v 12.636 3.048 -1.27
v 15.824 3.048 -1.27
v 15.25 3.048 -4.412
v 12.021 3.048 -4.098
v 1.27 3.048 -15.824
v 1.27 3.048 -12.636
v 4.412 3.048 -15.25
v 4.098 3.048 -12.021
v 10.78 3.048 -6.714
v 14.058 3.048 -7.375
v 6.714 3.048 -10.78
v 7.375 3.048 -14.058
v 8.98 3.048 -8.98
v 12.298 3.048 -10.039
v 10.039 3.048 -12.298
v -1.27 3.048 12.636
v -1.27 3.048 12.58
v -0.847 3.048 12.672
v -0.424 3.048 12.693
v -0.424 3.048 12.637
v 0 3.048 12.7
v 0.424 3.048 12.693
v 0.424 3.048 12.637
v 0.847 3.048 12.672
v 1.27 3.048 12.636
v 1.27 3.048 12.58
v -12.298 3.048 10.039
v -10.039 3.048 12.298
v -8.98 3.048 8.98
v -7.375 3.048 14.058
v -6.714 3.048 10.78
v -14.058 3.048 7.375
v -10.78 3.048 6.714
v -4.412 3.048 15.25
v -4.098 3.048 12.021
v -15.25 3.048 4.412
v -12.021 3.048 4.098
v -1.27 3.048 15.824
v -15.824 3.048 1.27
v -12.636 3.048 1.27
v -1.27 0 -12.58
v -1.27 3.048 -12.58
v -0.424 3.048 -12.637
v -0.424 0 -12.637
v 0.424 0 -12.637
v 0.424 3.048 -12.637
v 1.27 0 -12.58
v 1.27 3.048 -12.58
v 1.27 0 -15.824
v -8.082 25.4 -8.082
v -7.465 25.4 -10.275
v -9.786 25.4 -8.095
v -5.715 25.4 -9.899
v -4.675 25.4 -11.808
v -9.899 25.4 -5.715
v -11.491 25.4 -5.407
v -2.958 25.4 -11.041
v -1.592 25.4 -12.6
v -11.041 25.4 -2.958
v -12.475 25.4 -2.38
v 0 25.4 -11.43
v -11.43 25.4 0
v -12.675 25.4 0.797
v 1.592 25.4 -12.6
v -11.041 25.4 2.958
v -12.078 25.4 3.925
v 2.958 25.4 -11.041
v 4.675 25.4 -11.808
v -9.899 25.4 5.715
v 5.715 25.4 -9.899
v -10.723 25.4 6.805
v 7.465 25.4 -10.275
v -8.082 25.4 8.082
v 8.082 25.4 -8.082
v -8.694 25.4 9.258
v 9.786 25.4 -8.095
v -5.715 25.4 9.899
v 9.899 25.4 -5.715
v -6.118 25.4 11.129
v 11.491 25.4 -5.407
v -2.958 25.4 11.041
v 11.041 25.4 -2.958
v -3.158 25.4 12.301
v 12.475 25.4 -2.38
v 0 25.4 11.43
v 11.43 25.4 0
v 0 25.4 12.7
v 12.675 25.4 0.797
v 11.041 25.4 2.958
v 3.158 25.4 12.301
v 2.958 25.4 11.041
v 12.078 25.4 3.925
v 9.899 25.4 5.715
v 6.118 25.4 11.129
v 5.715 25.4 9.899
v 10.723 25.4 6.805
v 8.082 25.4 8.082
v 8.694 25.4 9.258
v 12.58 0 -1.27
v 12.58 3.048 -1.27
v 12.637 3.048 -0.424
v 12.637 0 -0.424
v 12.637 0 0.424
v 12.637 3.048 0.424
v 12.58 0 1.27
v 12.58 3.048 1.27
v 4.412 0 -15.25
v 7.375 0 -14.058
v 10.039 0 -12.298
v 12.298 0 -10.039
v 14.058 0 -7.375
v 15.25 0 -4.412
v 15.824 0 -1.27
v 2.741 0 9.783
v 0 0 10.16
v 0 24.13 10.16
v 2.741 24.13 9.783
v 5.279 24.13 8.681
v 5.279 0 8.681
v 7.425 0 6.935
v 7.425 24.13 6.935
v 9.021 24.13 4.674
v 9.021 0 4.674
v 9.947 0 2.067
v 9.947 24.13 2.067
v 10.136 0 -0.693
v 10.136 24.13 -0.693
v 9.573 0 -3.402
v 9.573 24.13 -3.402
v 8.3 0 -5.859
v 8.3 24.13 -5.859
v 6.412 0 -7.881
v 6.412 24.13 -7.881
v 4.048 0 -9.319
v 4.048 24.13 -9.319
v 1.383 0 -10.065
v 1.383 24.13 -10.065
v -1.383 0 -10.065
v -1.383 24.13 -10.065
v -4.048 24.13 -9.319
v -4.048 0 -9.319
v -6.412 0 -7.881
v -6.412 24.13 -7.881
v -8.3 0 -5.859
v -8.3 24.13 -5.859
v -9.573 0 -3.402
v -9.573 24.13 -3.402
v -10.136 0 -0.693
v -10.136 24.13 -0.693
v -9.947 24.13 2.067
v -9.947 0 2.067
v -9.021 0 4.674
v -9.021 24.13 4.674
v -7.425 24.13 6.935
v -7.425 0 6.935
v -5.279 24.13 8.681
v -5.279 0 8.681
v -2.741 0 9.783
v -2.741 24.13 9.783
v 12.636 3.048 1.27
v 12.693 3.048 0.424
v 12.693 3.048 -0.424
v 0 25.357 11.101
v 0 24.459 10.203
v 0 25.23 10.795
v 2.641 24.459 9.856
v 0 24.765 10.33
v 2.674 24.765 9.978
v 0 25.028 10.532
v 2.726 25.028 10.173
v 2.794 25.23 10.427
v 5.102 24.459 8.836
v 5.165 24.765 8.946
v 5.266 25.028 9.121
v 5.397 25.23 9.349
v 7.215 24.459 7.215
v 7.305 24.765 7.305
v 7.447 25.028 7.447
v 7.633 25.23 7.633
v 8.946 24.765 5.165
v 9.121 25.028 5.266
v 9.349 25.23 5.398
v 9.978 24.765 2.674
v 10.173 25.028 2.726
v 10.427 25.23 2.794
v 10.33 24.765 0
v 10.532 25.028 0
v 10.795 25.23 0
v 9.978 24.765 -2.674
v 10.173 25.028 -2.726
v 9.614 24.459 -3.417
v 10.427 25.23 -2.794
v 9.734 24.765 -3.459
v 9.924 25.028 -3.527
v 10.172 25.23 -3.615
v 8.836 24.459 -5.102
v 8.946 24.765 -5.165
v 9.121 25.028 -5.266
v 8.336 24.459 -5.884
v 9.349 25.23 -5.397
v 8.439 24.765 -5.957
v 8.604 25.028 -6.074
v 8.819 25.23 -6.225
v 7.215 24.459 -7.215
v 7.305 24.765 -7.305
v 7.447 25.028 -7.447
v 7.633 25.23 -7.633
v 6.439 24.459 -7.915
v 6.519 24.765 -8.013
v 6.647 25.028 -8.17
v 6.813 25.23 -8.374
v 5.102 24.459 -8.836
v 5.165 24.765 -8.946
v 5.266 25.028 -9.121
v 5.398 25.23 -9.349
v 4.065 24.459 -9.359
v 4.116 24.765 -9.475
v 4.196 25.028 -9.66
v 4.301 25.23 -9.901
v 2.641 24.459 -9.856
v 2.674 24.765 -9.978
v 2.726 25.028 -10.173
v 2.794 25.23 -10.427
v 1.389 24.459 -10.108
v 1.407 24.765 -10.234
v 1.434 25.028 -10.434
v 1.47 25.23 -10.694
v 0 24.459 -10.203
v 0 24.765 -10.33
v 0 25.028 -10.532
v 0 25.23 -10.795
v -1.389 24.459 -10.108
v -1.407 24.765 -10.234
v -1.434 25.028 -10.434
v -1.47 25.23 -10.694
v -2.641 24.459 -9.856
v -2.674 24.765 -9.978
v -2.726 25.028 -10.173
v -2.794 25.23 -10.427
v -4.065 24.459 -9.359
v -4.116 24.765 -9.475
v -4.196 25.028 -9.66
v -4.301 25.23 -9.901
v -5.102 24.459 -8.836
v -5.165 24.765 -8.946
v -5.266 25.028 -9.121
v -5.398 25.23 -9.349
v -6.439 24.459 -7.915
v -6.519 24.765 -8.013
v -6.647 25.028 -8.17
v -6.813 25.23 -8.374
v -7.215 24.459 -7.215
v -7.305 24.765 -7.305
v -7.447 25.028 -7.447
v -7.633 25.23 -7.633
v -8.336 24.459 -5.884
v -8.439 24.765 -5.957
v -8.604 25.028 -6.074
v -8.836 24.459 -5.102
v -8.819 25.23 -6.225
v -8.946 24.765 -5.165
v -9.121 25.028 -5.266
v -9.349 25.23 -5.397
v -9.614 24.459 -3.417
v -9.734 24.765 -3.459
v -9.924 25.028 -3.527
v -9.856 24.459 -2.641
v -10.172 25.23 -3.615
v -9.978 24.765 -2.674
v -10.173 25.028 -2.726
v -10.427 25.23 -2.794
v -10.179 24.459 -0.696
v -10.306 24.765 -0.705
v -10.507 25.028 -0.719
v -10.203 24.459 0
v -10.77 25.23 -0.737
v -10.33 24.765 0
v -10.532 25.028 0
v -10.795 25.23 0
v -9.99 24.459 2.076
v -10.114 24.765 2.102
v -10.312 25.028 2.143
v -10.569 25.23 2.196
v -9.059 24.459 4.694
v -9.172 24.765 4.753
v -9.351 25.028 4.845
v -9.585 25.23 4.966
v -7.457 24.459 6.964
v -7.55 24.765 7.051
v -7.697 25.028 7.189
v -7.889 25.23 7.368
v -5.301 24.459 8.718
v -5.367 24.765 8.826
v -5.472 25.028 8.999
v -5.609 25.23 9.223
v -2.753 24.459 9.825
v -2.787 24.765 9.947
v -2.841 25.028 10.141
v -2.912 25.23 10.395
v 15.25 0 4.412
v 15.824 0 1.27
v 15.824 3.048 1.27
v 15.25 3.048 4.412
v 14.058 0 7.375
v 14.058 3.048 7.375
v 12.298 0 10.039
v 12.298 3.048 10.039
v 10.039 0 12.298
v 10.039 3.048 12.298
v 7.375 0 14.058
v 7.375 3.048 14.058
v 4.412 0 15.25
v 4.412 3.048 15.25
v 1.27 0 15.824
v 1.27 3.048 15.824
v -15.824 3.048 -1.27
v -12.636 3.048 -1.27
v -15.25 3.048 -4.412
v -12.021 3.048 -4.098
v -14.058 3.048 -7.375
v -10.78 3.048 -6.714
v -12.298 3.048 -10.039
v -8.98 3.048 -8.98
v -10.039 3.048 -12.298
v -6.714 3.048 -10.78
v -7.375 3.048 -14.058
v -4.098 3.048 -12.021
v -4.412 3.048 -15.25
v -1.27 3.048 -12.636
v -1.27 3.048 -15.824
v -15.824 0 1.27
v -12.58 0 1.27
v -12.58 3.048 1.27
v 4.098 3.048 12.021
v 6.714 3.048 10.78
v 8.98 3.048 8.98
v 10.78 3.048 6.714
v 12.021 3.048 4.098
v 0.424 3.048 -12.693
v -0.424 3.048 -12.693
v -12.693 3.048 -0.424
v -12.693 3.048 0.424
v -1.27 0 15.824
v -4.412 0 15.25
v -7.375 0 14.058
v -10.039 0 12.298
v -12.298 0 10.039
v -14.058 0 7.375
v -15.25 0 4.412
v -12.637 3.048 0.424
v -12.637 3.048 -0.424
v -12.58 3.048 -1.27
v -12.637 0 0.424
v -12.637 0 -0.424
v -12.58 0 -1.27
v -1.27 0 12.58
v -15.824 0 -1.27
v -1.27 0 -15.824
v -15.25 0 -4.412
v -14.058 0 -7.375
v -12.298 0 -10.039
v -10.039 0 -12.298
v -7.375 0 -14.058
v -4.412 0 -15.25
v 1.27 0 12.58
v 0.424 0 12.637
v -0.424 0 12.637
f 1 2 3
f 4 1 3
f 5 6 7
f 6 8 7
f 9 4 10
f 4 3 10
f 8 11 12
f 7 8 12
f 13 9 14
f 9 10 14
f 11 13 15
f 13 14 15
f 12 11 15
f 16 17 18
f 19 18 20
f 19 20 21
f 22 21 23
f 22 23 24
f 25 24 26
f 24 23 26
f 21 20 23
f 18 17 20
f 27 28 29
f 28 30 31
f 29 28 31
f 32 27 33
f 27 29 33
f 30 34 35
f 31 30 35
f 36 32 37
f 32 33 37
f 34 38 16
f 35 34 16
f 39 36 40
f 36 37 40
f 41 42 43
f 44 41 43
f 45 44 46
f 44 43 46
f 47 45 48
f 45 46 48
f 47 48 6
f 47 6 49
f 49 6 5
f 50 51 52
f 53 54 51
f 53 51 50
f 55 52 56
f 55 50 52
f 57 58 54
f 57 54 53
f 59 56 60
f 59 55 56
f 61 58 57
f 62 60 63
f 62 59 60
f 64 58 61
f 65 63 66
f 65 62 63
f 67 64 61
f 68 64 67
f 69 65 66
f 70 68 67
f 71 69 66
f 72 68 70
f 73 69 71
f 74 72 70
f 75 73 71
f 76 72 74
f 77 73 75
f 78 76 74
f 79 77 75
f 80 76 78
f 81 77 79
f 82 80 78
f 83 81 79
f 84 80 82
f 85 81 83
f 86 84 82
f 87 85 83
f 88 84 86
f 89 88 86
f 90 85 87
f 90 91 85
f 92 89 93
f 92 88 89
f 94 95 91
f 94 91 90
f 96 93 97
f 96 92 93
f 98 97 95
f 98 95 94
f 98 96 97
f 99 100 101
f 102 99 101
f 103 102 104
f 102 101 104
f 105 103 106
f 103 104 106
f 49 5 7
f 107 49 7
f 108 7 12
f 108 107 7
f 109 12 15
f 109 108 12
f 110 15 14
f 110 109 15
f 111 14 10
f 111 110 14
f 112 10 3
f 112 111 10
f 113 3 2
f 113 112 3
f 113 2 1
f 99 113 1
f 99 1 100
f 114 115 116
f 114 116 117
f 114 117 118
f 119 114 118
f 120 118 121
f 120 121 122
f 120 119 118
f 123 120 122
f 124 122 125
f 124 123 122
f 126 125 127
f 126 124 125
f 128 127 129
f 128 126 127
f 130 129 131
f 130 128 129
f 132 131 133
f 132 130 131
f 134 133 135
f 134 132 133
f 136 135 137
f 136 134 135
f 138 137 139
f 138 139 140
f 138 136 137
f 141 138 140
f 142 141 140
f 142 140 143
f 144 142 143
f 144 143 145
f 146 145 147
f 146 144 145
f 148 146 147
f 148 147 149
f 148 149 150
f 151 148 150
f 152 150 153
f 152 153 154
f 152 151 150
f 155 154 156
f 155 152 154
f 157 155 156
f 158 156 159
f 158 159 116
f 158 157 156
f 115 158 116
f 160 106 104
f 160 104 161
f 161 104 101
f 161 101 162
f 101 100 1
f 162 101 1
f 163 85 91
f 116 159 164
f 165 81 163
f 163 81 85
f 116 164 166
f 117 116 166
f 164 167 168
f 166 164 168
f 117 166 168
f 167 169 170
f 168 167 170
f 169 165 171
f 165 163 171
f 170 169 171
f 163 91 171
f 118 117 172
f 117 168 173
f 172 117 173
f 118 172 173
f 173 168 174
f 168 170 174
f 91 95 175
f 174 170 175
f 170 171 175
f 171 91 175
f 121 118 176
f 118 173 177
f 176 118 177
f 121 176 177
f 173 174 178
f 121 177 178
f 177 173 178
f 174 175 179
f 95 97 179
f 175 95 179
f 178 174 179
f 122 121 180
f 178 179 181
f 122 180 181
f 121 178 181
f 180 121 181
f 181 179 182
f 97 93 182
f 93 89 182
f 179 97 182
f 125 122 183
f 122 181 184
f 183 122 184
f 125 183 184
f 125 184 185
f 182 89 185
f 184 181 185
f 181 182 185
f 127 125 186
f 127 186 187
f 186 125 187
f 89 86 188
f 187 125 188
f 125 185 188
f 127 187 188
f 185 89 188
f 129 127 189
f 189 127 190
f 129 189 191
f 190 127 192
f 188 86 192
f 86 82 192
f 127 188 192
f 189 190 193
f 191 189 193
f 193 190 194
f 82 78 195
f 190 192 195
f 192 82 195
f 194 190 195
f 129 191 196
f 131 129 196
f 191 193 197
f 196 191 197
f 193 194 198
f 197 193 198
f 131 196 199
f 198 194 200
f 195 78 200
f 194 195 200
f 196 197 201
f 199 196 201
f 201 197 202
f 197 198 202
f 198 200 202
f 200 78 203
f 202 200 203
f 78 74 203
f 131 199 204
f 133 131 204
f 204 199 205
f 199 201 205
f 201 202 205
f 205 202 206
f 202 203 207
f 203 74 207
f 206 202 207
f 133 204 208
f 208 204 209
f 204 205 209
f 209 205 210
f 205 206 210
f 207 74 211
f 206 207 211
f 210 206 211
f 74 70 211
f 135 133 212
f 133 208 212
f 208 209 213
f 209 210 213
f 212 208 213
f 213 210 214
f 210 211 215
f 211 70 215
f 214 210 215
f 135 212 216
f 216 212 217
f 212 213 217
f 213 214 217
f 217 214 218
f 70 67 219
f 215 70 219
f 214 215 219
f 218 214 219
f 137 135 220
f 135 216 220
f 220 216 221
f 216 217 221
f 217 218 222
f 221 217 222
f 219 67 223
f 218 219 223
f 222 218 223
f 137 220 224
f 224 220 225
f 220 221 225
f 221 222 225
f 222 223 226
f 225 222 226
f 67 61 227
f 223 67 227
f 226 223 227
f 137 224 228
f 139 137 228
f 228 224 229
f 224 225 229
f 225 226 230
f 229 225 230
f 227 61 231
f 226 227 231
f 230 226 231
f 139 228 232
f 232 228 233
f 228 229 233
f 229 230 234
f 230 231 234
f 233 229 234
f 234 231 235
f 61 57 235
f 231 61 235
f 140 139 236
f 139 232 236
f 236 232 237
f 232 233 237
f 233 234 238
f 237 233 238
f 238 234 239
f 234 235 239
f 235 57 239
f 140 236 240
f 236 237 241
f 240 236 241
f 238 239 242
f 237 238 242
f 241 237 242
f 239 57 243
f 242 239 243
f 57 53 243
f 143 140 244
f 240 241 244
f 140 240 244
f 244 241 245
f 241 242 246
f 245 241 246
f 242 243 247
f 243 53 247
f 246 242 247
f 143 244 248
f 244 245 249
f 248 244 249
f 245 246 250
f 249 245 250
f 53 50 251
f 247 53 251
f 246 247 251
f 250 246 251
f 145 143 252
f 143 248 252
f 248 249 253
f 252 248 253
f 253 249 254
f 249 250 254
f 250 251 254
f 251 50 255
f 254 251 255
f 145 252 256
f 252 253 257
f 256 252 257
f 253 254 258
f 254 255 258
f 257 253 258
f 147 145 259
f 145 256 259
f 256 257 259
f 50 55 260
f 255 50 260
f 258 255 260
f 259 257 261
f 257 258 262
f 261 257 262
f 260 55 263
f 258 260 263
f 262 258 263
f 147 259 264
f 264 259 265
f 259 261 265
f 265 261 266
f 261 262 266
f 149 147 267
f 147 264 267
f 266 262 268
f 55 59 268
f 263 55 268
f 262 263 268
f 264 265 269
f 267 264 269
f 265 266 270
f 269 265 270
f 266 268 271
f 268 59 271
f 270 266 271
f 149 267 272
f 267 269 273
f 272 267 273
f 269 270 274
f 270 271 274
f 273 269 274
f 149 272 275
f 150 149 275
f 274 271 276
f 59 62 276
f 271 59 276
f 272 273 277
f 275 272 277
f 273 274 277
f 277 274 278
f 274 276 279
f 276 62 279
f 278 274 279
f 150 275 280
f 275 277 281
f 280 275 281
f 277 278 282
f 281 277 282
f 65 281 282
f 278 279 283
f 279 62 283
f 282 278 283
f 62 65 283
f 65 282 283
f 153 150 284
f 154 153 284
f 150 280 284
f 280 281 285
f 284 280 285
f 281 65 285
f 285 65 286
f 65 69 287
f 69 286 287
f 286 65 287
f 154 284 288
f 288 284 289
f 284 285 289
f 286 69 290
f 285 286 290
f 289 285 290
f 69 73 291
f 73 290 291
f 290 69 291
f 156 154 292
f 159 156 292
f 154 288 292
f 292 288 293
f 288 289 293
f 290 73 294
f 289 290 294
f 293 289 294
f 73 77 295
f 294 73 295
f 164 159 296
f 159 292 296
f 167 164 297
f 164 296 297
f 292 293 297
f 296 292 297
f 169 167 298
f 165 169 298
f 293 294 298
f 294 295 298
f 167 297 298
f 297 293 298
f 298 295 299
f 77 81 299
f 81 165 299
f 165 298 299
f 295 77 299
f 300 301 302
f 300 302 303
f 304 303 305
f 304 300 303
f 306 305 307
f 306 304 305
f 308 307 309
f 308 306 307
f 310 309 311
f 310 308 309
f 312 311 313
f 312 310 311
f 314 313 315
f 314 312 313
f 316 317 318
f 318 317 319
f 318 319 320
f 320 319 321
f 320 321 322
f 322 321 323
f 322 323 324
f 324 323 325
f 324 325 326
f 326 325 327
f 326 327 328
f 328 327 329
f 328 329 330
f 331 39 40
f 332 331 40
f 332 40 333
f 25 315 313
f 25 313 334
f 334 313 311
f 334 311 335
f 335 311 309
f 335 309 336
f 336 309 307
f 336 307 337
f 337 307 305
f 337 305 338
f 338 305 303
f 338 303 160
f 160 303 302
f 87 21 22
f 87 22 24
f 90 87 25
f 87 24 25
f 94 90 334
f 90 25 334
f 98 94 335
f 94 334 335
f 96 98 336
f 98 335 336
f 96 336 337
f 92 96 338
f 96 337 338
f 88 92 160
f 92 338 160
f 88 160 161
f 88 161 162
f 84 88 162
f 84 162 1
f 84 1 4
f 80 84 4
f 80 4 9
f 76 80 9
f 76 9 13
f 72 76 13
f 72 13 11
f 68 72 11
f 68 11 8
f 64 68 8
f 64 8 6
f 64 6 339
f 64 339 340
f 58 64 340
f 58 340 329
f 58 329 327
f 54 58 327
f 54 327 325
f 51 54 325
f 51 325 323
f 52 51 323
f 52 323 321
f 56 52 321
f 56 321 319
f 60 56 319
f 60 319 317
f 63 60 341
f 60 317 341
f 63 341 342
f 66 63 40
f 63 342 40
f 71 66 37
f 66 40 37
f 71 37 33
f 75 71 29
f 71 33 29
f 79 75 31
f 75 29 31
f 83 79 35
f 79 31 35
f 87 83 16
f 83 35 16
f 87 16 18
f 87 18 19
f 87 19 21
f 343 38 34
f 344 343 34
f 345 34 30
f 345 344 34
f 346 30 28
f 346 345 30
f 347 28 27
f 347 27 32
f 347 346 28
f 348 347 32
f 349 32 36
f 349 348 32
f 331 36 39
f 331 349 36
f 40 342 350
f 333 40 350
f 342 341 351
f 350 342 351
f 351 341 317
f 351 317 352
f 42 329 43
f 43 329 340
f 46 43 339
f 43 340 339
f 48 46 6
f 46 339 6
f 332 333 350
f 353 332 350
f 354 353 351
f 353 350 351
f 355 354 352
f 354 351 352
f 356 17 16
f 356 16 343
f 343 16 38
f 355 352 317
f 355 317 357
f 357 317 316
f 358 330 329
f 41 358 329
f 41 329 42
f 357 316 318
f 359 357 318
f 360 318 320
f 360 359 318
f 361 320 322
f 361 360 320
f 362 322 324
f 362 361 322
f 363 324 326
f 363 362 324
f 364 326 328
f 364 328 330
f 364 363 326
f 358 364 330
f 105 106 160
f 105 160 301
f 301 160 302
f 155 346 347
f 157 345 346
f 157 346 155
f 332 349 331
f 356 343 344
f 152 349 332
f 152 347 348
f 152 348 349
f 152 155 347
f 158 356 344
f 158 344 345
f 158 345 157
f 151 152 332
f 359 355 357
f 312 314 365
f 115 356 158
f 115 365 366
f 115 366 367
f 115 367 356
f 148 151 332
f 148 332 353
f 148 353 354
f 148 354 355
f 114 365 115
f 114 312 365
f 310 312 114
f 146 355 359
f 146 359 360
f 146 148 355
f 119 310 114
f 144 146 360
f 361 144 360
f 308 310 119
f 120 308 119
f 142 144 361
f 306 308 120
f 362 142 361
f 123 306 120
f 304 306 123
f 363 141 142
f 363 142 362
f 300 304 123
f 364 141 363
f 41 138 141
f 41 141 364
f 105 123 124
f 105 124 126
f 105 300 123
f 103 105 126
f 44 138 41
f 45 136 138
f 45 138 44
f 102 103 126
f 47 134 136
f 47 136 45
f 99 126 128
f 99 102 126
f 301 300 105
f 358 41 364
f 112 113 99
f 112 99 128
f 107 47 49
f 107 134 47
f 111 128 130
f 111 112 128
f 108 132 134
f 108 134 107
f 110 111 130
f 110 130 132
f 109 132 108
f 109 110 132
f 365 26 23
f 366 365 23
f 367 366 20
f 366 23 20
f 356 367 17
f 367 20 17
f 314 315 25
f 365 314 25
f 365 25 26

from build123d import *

# Parameters (mm, degrees)
SKETCH1_R           = 12.7
SKETCH1_R_2         = 10.16
BOSS_EXTRUDE1_DEPTH = 25.4
FILLET1_R           = 1.27
SKETCH2_R           = 15.875
SKETCH2_R_2         = 12.7
BOSS_EXTRUDE2_DEPTH = 3.048
CUT_EXTRUDE1_DEPTH  = 3.048


with BuildPart() as part:
    # Sketch1 → Boss-Extrude1 (new body)
    with BuildSketch(Plane(origin=(0, 0, 0), x_dir=(1, 0, 0), z_dir=(0, 1, 0))):
        with Locations(Location((0, 0, 0), (0, 0, 270))):
            Circle(SKETCH1_R)
        with Locations(Location((0, 0, 0), (0, 0, 270))):
            Circle(SKETCH1_R_2, mode=Mode.SUBTRACT)
    extrude(amount=BOSS_EXTRUDE1_DEPTH)

    # Fillet1
    fillet1_edges = [part.edges().sort_by_distance(p)[0] for p in [
        (0, 25.4, -10.16),
    ]]
    fillet(fillet1_edges, radius=FILLET1_R)

    # Sketch2 → Boss-Extrude2 (add)
    with BuildSketch(Plane.XZ):
        with Locations(Location((0, 0, 0), (0, 0, 270))):
            Circle(SKETCH2_R)
        with Locations(Location((0, 0, 0), (0, 0, 270))):
            Circle(SKETCH2_R_2, mode=Mode.SUBTRACT)
    extrude(amount=-BOSS_EXTRUDE2_DEPTH)

    # Sketch3 → Cut-Extrude1 (cut)
    with BuildSketch(Plane(origin=(0, 3.048, 0), x_dir=(1, 0, 0), z_dir=(0, 1, 0))):
        with BuildLine():
            Line((-1.27, 16.390053577), (-1.27, 12.580053577))
            ThreePointArc((-1.27, 12.580053577), (0, 12.64399652), (1.27, 12.580053577))
            Line((1.27, 12.580053577), (1.27, 16.390053577))
            Line((1.27, 16.390053577), (-1.27, 16.390053577))
        make_face()
        with BuildLine():
            Line((12.580053577, -1.27), (16.390053577, -1.27))
            Line((16.390053577, -1.27), (16.390053577, 1.27))
            Line((16.390053577, 1.27), (12.580053577, 1.27))
            ThreePointArc((12.580053577, 1.27), (12.64399652, 0), (12.580053577, -1.27))
        make_face()
        with BuildLine():
            Line((-1.27, -12.580053577), (-1.27, -16.390053577))
            Line((-1.27, -16.390053577), (1.27, -16.390053577))
            Line((1.27, -16.390053577), (1.27, -12.580053577))
            ThreePointArc((1.27, -12.580053577), (0, -12.64399652), (-1.27, -12.580053577))
        make_face()
        with BuildLine():
            Line((-12.580053577, 1.27), (-16.390053577, 1.27))
            Line((-16.390053577, 1.27), (-16.390053577, -1.27))
            Line((-16.390053577, -1.27), (-12.580053577, -1.27))
            ThreePointArc((-12.580053577, -1.27), (-12.64399652, 0), (-12.580053577, 1.27))
        make_face()
    extrude(amount=-CUT_EXTRUDE1_DEPTH, mode=Mode.SUBTRACT)


solid = part.part
